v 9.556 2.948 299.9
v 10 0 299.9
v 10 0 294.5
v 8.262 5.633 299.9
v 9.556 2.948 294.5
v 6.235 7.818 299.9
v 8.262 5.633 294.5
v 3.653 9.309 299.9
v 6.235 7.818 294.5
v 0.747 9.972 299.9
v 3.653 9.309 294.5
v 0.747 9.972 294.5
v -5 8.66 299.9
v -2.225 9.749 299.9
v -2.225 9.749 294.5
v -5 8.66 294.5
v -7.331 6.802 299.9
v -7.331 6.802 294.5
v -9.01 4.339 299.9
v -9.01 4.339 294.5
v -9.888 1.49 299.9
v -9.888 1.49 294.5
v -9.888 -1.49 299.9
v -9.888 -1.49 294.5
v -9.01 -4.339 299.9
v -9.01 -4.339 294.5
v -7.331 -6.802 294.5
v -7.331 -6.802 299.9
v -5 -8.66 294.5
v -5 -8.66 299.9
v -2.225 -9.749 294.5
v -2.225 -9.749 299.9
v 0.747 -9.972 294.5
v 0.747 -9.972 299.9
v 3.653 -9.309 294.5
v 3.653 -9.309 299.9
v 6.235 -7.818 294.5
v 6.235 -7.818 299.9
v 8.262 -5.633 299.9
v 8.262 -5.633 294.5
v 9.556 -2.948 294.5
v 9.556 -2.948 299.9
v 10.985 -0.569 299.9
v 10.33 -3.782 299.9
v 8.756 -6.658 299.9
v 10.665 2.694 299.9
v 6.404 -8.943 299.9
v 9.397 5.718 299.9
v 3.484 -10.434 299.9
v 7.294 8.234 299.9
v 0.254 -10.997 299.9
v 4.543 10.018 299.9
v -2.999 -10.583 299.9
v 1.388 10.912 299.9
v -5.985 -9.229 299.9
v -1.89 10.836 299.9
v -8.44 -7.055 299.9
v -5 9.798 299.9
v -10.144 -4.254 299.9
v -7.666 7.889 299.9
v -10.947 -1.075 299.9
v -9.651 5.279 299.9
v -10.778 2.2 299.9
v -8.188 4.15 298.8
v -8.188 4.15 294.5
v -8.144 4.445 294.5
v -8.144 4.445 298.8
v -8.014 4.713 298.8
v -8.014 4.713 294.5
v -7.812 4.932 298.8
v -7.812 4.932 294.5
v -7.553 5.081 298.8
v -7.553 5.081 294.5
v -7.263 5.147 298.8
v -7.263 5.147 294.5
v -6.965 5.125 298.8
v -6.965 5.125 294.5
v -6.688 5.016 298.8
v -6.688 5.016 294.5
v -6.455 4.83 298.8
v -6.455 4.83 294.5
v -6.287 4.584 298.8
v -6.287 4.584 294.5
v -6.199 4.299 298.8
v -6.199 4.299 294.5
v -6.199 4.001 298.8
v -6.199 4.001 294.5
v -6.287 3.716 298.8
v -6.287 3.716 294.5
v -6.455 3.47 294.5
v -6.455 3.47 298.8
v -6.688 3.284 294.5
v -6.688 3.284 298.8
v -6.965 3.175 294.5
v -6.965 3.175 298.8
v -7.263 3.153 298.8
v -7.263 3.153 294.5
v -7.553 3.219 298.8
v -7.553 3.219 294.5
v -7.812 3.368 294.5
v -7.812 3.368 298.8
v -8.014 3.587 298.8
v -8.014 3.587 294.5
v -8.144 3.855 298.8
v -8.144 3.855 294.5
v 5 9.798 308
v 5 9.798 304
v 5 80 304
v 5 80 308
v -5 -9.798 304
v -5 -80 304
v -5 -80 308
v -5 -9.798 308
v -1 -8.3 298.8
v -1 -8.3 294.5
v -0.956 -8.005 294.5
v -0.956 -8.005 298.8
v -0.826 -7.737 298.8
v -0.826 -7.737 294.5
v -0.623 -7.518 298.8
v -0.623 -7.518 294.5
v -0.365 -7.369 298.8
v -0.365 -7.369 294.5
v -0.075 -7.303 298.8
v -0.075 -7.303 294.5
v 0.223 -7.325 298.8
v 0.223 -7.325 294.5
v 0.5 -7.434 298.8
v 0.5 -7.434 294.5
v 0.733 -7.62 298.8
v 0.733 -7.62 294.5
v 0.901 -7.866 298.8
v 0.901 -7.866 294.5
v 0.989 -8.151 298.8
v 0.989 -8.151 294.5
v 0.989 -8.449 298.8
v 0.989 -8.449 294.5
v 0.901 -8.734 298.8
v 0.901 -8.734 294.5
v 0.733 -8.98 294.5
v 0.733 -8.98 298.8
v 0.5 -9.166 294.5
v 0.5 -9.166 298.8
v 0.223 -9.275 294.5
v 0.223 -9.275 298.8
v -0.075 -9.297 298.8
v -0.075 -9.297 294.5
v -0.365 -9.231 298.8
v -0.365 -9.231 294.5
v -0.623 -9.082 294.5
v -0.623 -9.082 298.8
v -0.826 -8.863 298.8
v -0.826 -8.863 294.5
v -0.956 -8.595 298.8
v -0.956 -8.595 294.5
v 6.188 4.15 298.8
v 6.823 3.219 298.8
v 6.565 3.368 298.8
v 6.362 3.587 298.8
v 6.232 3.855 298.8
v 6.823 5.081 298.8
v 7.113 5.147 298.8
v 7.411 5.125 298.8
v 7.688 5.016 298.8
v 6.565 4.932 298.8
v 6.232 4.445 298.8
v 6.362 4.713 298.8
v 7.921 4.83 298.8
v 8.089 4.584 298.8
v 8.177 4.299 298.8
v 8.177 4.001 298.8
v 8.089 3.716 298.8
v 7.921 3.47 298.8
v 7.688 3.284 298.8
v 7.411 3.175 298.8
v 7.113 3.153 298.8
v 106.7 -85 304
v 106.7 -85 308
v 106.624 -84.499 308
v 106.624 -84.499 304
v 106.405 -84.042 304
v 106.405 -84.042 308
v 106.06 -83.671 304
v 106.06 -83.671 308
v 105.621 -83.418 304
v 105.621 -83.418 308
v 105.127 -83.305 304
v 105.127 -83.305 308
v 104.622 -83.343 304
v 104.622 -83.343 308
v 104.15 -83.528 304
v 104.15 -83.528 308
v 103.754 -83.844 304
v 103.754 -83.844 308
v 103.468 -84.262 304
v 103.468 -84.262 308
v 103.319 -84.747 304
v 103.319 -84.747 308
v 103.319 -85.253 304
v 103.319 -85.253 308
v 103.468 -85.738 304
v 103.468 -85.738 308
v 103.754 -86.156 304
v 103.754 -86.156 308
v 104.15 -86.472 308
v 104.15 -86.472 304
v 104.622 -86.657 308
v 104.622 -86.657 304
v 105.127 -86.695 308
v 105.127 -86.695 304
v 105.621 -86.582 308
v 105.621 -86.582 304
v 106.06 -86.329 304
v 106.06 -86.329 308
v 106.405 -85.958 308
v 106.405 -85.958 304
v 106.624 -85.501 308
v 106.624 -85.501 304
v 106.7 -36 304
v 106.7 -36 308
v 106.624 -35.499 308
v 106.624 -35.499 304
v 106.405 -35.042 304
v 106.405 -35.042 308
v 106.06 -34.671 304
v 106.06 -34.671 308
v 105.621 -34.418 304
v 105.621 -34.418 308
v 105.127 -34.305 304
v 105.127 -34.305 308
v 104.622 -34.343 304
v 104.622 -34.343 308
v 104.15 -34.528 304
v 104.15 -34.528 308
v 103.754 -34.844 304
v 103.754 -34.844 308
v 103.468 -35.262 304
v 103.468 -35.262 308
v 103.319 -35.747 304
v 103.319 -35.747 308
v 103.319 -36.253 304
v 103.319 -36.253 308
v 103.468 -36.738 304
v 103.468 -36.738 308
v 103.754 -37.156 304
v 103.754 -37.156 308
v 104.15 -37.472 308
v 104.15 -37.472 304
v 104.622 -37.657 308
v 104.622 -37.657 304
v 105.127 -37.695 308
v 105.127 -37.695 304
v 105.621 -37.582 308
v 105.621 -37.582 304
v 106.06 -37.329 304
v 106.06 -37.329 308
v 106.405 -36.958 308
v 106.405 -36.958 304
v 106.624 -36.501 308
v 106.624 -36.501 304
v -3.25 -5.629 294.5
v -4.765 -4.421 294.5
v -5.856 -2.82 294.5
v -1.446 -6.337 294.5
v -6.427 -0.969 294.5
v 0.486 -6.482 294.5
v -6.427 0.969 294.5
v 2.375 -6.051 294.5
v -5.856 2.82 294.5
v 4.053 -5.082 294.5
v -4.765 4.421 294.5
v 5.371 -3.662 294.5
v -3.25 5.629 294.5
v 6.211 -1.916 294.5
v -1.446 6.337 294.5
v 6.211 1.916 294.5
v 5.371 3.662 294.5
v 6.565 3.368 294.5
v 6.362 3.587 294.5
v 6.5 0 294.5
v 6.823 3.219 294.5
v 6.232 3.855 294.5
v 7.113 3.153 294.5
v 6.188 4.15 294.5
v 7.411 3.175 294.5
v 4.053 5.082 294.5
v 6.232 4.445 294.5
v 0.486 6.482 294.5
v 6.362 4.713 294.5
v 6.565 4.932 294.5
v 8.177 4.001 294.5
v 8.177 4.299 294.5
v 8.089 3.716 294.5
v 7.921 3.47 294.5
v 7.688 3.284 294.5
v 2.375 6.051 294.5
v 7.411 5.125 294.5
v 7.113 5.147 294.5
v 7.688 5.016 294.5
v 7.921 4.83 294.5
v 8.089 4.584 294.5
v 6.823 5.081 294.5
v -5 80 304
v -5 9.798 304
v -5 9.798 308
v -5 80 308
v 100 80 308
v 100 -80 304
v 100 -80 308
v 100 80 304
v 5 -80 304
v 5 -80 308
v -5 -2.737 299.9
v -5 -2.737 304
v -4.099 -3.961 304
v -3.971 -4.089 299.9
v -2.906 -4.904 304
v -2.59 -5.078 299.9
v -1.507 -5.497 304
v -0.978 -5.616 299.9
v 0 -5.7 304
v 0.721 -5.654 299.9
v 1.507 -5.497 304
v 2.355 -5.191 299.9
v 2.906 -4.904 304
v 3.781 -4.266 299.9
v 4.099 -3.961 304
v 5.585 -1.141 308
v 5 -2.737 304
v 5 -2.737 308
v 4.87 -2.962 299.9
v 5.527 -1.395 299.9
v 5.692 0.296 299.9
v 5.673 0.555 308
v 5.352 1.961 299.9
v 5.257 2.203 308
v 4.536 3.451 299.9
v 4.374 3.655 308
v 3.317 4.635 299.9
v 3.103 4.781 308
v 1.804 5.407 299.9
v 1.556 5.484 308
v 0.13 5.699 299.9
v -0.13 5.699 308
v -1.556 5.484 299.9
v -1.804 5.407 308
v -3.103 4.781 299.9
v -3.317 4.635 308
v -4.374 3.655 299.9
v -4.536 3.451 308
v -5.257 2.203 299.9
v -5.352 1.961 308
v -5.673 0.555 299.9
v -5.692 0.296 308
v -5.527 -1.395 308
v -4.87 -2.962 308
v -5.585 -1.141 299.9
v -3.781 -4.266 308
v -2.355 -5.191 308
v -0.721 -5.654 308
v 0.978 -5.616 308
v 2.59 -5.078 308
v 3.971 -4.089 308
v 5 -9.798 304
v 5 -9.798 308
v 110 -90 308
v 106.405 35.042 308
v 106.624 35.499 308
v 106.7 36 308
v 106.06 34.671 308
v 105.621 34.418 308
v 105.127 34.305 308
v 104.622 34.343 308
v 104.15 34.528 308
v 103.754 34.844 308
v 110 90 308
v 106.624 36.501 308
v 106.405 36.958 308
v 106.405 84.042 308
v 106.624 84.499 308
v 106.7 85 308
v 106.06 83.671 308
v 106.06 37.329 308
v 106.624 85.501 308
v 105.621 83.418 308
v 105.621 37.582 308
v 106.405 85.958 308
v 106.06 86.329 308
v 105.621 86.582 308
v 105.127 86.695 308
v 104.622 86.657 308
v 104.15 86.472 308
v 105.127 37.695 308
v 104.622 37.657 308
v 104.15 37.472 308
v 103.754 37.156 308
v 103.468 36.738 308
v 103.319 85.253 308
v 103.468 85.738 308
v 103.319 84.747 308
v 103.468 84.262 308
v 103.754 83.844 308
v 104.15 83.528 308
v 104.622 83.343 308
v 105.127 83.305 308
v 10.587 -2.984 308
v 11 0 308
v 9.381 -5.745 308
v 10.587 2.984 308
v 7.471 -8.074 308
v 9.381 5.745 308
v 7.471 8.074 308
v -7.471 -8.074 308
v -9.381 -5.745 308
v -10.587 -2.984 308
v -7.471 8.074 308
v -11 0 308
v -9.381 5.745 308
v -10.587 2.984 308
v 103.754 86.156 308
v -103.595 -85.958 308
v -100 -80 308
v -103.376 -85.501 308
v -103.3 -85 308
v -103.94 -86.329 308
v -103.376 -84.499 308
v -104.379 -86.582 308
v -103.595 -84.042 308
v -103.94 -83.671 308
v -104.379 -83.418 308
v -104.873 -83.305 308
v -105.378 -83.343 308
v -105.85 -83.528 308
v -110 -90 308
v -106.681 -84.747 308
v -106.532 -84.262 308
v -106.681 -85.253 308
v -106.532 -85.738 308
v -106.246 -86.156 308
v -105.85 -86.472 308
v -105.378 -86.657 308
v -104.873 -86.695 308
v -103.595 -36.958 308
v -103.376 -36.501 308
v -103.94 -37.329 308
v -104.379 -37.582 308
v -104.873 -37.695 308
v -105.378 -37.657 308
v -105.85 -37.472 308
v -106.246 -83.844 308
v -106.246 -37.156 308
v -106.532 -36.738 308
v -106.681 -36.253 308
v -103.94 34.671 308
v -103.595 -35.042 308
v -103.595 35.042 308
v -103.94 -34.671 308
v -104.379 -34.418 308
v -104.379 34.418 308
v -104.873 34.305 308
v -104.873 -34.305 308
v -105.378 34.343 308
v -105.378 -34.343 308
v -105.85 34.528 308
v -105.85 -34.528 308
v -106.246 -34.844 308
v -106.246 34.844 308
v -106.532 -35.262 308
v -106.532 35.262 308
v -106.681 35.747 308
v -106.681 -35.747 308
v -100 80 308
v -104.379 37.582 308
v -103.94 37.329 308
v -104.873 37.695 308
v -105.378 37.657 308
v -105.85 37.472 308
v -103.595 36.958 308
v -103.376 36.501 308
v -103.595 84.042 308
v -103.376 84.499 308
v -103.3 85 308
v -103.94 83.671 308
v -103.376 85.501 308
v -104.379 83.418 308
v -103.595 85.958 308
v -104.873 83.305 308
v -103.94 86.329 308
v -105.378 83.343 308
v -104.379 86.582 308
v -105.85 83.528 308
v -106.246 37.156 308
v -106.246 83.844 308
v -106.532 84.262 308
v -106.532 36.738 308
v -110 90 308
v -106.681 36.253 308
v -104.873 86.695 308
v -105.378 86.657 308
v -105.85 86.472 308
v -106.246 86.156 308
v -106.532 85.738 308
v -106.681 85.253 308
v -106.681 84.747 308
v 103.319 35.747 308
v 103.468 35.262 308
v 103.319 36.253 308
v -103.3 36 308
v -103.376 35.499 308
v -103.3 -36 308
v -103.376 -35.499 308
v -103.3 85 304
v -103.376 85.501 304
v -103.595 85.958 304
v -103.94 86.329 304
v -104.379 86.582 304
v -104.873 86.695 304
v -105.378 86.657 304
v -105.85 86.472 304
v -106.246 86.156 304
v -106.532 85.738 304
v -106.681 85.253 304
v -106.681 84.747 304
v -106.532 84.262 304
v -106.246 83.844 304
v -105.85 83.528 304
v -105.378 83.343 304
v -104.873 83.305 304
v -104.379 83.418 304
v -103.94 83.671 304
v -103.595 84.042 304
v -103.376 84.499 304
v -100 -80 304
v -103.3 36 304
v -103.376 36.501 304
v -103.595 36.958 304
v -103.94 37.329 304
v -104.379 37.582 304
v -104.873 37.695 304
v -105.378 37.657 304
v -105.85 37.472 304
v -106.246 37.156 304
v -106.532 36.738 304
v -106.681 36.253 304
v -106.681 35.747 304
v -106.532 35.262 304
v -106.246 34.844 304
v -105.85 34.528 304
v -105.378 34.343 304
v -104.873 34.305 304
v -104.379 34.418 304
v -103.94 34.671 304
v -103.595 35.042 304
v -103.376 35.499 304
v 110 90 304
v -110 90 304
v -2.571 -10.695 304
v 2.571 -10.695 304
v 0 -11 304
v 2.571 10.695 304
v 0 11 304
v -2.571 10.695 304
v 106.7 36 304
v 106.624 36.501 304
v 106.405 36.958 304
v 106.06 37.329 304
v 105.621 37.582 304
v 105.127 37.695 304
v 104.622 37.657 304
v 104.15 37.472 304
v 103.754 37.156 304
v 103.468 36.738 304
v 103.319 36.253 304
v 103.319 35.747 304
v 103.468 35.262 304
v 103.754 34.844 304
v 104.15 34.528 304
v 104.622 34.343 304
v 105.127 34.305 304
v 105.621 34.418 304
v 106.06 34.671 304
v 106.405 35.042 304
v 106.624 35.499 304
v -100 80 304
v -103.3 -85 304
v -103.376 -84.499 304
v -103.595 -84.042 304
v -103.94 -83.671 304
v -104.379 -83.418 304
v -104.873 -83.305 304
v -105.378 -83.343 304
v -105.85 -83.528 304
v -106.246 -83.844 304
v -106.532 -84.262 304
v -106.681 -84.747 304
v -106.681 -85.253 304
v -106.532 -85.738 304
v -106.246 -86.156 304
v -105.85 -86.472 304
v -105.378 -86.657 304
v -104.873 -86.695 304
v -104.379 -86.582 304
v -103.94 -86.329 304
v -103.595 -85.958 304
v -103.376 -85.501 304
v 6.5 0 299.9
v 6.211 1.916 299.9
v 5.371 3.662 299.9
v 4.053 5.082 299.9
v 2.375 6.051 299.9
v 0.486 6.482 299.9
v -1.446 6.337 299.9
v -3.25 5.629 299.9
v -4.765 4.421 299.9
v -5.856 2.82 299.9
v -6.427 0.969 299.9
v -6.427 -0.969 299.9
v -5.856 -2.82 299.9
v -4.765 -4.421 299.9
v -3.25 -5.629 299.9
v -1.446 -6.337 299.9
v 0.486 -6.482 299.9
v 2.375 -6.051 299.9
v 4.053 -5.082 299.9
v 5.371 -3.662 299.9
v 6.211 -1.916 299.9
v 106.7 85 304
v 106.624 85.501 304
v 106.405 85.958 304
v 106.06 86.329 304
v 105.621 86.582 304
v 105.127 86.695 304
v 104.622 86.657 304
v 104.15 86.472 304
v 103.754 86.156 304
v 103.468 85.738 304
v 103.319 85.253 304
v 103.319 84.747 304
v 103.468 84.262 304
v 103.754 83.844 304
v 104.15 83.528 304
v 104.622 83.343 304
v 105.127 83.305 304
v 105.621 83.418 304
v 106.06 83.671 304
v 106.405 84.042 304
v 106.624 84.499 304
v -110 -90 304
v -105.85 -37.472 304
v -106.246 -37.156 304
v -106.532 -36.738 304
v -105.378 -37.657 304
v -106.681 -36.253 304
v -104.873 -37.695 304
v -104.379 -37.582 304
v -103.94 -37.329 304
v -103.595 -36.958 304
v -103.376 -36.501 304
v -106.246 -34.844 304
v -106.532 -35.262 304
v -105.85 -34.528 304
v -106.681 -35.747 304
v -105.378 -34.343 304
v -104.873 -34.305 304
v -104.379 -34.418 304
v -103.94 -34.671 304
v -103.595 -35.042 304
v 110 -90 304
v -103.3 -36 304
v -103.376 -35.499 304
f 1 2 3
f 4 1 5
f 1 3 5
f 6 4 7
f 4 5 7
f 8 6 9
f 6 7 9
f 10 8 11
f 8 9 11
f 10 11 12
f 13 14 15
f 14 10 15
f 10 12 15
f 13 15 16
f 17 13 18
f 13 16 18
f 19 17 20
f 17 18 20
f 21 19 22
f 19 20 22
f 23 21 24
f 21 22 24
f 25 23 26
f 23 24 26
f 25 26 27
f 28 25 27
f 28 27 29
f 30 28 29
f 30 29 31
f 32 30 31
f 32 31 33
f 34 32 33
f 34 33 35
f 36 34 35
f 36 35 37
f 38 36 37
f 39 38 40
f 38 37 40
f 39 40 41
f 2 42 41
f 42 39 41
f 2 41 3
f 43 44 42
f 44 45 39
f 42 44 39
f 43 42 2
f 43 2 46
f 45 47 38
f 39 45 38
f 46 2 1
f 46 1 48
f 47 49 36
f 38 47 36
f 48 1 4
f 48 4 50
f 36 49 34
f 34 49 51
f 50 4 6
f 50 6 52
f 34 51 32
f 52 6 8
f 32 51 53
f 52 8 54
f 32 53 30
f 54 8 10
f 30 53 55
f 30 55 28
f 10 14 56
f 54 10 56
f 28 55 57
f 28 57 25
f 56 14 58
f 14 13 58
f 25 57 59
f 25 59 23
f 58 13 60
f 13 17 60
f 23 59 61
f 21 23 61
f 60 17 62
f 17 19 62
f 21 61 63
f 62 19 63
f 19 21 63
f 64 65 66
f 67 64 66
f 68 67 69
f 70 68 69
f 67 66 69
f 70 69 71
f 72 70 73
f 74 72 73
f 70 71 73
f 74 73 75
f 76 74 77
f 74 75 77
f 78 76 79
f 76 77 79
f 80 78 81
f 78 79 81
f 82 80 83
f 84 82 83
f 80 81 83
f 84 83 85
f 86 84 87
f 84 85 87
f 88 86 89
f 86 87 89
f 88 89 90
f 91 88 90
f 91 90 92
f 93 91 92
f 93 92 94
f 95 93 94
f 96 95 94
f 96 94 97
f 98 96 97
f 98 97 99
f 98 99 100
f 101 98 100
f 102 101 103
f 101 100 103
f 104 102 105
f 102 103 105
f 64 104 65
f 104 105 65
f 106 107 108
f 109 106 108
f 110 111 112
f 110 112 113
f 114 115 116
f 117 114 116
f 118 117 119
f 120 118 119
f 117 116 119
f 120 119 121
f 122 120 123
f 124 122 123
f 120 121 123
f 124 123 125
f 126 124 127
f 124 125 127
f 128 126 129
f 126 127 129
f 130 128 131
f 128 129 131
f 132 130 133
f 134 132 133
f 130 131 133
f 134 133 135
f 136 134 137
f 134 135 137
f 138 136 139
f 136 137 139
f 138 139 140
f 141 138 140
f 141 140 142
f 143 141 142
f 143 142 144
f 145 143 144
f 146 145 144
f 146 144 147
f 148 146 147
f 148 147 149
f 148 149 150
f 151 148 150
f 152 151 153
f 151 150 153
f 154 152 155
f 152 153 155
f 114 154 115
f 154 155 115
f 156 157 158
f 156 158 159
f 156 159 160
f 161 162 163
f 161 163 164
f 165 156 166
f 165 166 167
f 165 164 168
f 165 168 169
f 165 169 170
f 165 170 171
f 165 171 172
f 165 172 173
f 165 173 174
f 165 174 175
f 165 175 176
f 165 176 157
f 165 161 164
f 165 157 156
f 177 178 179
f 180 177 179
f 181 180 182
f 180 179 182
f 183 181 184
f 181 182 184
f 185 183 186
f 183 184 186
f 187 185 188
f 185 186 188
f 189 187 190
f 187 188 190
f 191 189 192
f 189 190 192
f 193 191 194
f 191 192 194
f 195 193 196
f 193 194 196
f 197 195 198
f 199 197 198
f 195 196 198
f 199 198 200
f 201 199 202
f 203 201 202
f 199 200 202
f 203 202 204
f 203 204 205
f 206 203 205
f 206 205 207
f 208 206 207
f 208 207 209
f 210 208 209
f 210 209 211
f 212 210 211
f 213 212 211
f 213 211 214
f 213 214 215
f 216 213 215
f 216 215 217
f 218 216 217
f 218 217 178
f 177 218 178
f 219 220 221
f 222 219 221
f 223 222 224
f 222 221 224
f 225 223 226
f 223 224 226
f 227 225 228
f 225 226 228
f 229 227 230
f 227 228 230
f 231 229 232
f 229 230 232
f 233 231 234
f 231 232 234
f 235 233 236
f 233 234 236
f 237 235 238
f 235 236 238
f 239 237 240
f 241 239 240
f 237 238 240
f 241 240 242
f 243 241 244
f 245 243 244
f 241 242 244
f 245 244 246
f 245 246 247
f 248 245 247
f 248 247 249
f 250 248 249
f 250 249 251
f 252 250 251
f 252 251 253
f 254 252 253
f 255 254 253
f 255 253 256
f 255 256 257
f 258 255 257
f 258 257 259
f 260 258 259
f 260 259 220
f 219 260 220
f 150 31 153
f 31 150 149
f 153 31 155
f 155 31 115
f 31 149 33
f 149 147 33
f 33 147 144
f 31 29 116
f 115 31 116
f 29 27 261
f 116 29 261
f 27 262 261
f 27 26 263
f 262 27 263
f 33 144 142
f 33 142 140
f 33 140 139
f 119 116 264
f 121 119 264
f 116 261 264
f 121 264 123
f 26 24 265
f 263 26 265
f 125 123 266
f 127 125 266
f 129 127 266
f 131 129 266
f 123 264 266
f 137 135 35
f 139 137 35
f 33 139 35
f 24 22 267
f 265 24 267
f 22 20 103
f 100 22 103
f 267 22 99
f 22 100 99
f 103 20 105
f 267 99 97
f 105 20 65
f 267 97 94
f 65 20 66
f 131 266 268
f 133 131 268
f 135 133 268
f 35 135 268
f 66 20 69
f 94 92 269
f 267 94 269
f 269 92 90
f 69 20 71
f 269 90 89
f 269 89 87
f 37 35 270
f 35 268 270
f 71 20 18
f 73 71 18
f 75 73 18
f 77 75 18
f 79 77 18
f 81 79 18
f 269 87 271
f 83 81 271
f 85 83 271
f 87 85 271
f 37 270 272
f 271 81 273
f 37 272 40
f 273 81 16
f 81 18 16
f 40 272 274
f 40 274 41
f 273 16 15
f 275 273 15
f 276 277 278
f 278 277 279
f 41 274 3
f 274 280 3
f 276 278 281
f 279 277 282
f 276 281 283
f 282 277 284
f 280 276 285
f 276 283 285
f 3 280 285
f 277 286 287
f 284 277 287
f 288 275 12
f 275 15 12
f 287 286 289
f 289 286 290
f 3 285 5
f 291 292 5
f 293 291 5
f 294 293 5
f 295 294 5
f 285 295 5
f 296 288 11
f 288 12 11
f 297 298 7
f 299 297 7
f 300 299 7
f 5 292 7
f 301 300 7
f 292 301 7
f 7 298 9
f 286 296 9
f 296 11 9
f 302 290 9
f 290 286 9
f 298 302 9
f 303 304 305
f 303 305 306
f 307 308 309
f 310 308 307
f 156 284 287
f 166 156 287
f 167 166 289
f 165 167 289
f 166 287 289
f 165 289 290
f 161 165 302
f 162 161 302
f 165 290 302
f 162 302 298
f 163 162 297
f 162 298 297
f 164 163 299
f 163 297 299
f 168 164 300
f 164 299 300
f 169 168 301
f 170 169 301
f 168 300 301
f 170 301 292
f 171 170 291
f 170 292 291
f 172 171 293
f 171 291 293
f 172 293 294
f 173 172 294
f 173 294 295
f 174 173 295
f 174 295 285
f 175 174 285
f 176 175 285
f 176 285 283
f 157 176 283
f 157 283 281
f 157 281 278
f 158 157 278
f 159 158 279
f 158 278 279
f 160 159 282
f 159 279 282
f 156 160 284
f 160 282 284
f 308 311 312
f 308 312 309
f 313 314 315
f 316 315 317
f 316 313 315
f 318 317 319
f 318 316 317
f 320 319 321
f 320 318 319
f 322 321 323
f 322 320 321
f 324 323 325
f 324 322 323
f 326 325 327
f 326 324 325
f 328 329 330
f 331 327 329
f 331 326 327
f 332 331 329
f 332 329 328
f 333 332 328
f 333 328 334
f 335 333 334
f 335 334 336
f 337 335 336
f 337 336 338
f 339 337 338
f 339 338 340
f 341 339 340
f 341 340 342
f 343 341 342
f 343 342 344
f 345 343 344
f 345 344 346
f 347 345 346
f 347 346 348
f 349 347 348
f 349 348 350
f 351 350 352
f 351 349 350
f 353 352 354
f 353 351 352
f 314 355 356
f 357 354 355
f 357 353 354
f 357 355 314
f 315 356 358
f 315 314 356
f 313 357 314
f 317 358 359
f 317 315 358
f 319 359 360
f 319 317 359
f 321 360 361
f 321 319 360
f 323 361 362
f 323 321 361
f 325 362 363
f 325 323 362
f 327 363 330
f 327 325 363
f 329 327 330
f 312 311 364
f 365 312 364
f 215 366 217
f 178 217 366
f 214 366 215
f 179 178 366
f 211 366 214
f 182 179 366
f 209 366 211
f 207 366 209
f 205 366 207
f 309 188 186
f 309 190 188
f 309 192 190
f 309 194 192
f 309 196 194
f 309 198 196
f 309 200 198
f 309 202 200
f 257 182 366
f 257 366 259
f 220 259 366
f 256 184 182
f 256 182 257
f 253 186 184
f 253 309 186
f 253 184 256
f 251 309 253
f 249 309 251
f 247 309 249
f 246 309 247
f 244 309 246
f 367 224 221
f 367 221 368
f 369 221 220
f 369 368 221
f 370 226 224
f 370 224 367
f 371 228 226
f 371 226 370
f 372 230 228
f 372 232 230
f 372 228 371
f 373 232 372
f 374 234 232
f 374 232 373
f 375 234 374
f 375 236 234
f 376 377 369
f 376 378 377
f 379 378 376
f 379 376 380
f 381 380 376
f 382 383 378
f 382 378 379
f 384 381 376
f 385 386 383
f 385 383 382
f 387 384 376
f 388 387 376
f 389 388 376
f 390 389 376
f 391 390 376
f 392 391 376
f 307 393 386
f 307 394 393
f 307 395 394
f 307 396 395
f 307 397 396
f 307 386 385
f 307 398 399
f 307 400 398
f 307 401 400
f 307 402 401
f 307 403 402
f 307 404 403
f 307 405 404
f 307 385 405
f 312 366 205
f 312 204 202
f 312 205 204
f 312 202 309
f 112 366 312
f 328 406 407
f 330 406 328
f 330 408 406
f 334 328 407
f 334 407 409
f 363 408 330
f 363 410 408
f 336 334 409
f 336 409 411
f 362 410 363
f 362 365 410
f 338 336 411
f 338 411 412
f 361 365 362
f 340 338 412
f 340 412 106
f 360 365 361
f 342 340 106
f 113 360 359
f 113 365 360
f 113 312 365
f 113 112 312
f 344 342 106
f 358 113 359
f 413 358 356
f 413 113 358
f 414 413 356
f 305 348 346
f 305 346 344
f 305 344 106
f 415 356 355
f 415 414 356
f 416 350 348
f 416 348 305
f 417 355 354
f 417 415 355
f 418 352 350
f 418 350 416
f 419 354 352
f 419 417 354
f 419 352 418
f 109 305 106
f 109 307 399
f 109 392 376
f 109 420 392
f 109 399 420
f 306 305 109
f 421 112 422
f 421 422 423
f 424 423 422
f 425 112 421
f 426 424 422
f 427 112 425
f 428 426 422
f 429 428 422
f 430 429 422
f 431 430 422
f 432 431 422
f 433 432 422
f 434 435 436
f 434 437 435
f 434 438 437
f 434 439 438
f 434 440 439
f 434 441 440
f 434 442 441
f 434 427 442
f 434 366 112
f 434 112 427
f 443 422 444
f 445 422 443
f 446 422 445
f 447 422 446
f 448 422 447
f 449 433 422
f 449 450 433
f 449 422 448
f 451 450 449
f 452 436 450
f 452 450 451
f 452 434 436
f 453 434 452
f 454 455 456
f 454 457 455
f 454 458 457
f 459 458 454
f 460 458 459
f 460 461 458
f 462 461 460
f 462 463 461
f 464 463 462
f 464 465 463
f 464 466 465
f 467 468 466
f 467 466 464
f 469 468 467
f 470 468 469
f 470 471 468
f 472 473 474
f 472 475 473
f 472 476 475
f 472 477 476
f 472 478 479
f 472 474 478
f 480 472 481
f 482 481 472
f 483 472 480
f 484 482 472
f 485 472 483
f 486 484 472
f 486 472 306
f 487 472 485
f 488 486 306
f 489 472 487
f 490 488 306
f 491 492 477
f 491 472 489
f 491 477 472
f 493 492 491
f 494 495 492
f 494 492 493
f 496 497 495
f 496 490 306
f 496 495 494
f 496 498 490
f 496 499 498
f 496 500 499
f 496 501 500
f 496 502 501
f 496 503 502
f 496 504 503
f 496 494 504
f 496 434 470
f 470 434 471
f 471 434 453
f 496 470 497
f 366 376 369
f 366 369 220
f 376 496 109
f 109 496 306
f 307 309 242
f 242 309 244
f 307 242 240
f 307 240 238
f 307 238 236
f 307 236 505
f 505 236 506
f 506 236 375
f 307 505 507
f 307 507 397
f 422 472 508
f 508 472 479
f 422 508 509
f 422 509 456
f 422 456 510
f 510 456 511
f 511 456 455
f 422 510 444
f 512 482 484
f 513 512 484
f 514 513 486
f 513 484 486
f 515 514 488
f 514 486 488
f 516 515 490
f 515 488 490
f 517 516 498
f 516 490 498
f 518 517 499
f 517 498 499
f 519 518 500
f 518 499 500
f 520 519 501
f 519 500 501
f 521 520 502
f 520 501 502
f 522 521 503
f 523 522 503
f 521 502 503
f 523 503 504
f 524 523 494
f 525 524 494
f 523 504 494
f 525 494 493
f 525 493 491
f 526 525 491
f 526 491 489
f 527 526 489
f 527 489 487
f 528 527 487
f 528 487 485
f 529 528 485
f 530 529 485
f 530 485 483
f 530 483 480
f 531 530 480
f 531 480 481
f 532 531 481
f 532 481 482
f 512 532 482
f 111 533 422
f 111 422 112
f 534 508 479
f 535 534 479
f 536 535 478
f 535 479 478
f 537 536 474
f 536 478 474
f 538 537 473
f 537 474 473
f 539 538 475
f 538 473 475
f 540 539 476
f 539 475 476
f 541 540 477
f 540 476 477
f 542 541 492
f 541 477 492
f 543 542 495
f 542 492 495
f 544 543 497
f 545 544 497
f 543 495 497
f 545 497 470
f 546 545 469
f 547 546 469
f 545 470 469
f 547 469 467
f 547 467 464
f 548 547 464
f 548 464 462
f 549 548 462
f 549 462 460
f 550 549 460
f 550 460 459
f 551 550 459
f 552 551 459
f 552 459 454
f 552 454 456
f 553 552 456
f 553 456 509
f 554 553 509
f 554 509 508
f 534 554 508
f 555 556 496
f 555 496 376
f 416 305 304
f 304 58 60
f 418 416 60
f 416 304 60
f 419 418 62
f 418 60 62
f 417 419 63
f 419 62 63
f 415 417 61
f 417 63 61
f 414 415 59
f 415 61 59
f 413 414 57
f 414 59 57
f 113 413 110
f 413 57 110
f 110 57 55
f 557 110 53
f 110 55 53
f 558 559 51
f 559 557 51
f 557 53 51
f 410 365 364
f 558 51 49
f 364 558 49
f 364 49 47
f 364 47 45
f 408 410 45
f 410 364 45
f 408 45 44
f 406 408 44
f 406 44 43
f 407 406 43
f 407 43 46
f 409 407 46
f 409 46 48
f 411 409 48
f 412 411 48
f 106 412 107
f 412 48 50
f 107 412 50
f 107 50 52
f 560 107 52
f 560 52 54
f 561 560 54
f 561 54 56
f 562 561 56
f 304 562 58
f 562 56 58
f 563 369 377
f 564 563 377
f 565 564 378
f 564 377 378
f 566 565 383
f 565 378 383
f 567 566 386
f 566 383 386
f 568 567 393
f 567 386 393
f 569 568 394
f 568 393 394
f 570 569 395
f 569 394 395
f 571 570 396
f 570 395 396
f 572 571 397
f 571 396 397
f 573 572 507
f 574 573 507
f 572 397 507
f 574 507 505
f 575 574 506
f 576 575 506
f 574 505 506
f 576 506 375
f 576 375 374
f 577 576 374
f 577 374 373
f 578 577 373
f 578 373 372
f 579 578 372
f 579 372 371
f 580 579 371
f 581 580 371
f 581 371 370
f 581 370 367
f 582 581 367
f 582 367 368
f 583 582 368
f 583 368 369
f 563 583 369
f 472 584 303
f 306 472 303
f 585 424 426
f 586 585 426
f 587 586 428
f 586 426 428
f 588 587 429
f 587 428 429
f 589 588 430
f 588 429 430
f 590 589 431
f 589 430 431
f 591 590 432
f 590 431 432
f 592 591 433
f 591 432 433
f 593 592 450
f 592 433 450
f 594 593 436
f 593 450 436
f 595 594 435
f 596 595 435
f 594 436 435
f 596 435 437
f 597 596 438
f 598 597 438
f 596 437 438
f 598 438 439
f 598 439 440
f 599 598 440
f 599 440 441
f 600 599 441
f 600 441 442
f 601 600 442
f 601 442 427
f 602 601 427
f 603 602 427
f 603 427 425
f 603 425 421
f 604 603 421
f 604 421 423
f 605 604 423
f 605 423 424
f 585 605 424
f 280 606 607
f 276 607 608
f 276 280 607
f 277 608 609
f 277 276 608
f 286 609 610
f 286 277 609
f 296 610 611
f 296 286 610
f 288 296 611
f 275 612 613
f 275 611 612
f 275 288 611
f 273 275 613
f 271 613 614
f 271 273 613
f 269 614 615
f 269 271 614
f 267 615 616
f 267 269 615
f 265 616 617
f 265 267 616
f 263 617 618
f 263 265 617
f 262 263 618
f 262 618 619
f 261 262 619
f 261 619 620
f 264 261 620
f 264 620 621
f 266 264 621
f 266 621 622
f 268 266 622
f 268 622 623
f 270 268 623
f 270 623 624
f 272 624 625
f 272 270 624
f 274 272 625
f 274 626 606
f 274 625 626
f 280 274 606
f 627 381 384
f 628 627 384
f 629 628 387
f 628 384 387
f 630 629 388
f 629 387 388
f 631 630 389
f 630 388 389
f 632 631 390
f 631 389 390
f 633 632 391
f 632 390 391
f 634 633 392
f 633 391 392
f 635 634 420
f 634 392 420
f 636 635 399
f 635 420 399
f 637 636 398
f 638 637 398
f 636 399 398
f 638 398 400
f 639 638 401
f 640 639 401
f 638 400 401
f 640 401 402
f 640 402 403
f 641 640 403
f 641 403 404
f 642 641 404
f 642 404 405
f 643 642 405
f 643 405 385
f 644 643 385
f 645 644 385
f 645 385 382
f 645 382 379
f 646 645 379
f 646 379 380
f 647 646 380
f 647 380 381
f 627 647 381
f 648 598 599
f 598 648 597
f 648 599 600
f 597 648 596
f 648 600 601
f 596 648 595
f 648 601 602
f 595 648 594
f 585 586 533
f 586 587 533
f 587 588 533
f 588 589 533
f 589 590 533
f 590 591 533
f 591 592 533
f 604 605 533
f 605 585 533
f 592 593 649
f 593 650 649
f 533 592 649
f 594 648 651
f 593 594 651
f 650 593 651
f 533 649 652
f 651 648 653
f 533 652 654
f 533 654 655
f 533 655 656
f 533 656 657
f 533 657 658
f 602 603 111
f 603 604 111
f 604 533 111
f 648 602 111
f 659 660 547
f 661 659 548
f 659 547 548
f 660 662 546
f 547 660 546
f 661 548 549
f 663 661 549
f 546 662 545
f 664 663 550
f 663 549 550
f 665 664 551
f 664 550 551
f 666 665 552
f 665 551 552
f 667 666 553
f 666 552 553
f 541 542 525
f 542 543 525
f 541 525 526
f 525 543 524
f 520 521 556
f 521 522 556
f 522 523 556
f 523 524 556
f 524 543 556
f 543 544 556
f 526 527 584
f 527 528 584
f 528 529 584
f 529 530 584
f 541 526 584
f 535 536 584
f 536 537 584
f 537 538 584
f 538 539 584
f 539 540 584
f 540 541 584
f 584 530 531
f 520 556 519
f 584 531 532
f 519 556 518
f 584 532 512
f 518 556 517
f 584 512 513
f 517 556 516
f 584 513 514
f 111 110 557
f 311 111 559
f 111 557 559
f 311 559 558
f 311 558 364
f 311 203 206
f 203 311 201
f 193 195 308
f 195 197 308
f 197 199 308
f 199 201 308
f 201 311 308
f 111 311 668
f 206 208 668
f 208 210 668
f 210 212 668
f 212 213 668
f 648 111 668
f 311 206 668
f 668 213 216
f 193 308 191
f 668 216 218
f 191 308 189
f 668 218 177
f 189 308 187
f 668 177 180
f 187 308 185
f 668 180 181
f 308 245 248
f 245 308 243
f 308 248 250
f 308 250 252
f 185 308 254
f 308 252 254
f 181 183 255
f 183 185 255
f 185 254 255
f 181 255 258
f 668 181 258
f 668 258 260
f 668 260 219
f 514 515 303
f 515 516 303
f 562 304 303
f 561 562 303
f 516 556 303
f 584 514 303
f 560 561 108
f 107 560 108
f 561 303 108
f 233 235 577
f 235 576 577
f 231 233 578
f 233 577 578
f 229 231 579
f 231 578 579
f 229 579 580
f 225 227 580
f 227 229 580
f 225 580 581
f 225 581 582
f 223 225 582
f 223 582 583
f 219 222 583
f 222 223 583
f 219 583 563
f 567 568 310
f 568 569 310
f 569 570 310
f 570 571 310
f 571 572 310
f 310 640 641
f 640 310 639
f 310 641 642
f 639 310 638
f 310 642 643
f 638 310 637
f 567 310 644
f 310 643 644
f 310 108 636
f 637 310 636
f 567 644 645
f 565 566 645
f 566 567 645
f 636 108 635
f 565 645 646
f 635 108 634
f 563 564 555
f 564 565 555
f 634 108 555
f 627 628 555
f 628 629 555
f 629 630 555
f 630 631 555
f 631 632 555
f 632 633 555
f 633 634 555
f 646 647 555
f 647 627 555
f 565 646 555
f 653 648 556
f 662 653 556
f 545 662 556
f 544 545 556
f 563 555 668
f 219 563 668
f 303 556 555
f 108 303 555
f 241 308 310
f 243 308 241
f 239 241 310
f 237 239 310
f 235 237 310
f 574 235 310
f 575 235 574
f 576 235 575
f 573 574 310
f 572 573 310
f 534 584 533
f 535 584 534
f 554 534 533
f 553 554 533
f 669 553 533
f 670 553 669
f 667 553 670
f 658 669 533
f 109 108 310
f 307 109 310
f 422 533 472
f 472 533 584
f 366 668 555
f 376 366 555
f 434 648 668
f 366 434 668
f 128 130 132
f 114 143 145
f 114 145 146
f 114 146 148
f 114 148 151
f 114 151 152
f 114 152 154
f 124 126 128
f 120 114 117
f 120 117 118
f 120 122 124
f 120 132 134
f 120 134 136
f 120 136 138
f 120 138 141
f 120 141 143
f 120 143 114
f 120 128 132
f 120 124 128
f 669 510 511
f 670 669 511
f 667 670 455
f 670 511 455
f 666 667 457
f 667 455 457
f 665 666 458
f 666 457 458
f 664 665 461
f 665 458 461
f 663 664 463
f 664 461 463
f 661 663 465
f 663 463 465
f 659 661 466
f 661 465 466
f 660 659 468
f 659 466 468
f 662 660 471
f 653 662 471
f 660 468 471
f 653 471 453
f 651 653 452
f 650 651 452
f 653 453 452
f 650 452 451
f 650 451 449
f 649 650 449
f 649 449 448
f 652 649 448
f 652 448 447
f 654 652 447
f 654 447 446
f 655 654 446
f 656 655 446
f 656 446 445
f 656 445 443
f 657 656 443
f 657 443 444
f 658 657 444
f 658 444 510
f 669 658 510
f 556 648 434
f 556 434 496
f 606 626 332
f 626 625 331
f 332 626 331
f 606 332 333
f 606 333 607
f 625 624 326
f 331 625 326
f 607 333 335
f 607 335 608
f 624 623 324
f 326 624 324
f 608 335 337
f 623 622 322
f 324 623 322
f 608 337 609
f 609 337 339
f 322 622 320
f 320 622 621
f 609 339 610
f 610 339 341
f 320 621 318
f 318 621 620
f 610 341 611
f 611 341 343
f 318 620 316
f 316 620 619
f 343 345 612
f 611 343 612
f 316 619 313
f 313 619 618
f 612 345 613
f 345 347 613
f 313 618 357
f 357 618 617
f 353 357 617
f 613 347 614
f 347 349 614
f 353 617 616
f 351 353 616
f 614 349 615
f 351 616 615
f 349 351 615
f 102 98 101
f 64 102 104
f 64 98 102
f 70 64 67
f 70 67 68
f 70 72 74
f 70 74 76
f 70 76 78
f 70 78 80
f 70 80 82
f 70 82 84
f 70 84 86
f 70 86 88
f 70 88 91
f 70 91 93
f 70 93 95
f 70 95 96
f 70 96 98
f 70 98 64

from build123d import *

# Parameters (mm, degrees)
UPPER_PERIMETER_START                         = 304
SKETCH1_W                                     = 220
SKETCH1_H                                     = 180
SKETCH1_W_2                                   = 200
SKETCH1_H_2                                   = 160
UPPER_PERIMETER_DEPTH                         = 4
BEARING_SPINE_START                           = 304
SKETCH2_W                                     = 10
SKETCH2_H                                     = 170
BEARING_SPINE_DEPTH                           = 4
UPPER_OUTER_RACE_STOP_START                   = 299.9
SKETCH3_R                                     = 11
SKETCH3_R_2                                   = 5.7
UPPER_OUTER_RACE_STOP_DEPTH                   = 8.1
FLOATING_OUTER_RACE_SEAT_START                = 294.5
SKETCH4_R                                     = 10
SKETCH4_R_2                                   = 6.5
FLOATING_OUTER_RACE_SEAT_DEPTH                = 5.41
SHAFT_CLIP_CLEARANCE_START                    = -8.11
SKETCH5_R                                     = 5.7
SHAFT_CLIP_CLEARANCE_DEPTH                    = 8.11
SKETCH6_R                                     = 1.7
FOUR_TIE_ROD_CLEARANCE_DEPTH                  = 4.01
SKETCH7_R                                     = 1
THREE_M2_TOP_CAP_THREAD_MAJOR_ENVELOPES_DEPTH = 4.3
SKETCH8_R                                     = 1.7
BENCH_MOTOR_CROSSBEAM_FOUR_D3P4_DEPTH         = 4.01


with BuildPart() as part:
    # Sketch1 → Upper_Perimeter (new body)
    with BuildSketch(Plane.XY.offset(UPPER_PERIMETER_START)):
        Rectangle(SKETCH1_W, SKETCH1_H)
        Rectangle(SKETCH1_W_2, SKETCH1_H_2, mode=Mode.SUBTRACT)
    extrude(amount=UPPER_PERIMETER_DEPTH)

    # Sketch2 → Bearing_Spine (add)
    with BuildSketch(Plane.XY.offset(BEARING_SPINE_START)):
        Rectangle(SKETCH2_W, SKETCH2_H)
    extrude(amount=BEARING_SPINE_DEPTH)

    # Sketch3 → Upper_Outer_Race_Stop (add)
    with BuildSketch(Plane.XY.offset(UPPER_OUTER_RACE_STOP_START)):
        with Locations(Location((0, 0, 0), (0, 0, 117.035691789))):
            Circle(SKETCH3_R)
        with Locations(Location((0, 0, 0), (0, 0, 208.694413527))):
            Circle(SKETCH3_R_2, mode=Mode.SUBTRACT)
    extrude(amount=UPPER_OUTER_RACE_STOP_DEPTH)

    # Sketch4 → Floating_Outer_Race_Seat (add)
    with BuildSketch(Plane.XY.offset(FLOATING_OUTER_RACE_SEAT_START)):
        Circle(SKETCH4_R)
        Circle(SKETCH4_R_2, mode=Mode.SUBTRACT)
    extrude(amount=FLOATING_OUTER_RACE_SEAT_DEPTH)

    # Sketch5 → Shaft_Clip_Clearance (cut)
    with BuildSketch(Plane.XY.offset(308).offset(SHAFT_CLIP_CLEARANCE_START)):
        Circle(SKETCH5_R)
    extrude(amount=SHAFT_CLIP_CLEARANCE_DEPTH, mode=Mode.SUBTRACT)

    # Sketch6 → Four_Tie_Rod_Clearance (cut)
    with BuildSketch(Plane.XY.offset(308)):
        with Locations((-105, -85)):
            Circle(SKETCH6_R)
        with Locations((-105, 85)):
            Circle(SKETCH6_R)
        with Locations((105, -85)):
            Circle(SKETCH6_R)
        with Locations((105, 85)):
            Circle(SKETCH6_R)
    extrude(amount=-FOUR_TIE_ROD_CLEARANCE_DEPTH, mode=Mode.SUBTRACT)

    # Sketch7 → Three_M2_Top_Cap_Thread_Major_Envelopes (cut)
    with BuildSketch(Plane(origin=(0, 0, 294.5), x_dir=(-1, 0, 0), z_dir=(0, 0, -1))):
        with Locations((-7.188010851, 4.15)):
            Circle(SKETCH7_R)
        with Locations((7.188010851, 4.15)):
            Circle(SKETCH7_R)
        with Locations((0, -8.3)):
            Circle(SKETCH7_R)
    extrude(amount=-THREE_M2_TOP_CAP_THREAD_MAJOR_ENVELOPES_DEPTH, mode=Mode.SUBTRACT)

    # Sketch8 → Bench_Motor_Crossbeam_Four_D3p4 (cut)
    with BuildSketch(Plane.XY.offset(308)):
        with Locations((-105, -36)):
            Circle(SKETCH8_R)
        with Locations((-105, 36)):
            Circle(SKETCH8_R)
        with Locations((105, -36)):
            Circle(SKETCH8_R)
        with Locations((105, 36)):
            Circle(SKETCH8_R)
    extrude(amount=-BENCH_MOTOR_CROSSBEAM_FOUR_D3P4_DEPTH, mode=Mode.SUBTRACT)


solid = part.part
